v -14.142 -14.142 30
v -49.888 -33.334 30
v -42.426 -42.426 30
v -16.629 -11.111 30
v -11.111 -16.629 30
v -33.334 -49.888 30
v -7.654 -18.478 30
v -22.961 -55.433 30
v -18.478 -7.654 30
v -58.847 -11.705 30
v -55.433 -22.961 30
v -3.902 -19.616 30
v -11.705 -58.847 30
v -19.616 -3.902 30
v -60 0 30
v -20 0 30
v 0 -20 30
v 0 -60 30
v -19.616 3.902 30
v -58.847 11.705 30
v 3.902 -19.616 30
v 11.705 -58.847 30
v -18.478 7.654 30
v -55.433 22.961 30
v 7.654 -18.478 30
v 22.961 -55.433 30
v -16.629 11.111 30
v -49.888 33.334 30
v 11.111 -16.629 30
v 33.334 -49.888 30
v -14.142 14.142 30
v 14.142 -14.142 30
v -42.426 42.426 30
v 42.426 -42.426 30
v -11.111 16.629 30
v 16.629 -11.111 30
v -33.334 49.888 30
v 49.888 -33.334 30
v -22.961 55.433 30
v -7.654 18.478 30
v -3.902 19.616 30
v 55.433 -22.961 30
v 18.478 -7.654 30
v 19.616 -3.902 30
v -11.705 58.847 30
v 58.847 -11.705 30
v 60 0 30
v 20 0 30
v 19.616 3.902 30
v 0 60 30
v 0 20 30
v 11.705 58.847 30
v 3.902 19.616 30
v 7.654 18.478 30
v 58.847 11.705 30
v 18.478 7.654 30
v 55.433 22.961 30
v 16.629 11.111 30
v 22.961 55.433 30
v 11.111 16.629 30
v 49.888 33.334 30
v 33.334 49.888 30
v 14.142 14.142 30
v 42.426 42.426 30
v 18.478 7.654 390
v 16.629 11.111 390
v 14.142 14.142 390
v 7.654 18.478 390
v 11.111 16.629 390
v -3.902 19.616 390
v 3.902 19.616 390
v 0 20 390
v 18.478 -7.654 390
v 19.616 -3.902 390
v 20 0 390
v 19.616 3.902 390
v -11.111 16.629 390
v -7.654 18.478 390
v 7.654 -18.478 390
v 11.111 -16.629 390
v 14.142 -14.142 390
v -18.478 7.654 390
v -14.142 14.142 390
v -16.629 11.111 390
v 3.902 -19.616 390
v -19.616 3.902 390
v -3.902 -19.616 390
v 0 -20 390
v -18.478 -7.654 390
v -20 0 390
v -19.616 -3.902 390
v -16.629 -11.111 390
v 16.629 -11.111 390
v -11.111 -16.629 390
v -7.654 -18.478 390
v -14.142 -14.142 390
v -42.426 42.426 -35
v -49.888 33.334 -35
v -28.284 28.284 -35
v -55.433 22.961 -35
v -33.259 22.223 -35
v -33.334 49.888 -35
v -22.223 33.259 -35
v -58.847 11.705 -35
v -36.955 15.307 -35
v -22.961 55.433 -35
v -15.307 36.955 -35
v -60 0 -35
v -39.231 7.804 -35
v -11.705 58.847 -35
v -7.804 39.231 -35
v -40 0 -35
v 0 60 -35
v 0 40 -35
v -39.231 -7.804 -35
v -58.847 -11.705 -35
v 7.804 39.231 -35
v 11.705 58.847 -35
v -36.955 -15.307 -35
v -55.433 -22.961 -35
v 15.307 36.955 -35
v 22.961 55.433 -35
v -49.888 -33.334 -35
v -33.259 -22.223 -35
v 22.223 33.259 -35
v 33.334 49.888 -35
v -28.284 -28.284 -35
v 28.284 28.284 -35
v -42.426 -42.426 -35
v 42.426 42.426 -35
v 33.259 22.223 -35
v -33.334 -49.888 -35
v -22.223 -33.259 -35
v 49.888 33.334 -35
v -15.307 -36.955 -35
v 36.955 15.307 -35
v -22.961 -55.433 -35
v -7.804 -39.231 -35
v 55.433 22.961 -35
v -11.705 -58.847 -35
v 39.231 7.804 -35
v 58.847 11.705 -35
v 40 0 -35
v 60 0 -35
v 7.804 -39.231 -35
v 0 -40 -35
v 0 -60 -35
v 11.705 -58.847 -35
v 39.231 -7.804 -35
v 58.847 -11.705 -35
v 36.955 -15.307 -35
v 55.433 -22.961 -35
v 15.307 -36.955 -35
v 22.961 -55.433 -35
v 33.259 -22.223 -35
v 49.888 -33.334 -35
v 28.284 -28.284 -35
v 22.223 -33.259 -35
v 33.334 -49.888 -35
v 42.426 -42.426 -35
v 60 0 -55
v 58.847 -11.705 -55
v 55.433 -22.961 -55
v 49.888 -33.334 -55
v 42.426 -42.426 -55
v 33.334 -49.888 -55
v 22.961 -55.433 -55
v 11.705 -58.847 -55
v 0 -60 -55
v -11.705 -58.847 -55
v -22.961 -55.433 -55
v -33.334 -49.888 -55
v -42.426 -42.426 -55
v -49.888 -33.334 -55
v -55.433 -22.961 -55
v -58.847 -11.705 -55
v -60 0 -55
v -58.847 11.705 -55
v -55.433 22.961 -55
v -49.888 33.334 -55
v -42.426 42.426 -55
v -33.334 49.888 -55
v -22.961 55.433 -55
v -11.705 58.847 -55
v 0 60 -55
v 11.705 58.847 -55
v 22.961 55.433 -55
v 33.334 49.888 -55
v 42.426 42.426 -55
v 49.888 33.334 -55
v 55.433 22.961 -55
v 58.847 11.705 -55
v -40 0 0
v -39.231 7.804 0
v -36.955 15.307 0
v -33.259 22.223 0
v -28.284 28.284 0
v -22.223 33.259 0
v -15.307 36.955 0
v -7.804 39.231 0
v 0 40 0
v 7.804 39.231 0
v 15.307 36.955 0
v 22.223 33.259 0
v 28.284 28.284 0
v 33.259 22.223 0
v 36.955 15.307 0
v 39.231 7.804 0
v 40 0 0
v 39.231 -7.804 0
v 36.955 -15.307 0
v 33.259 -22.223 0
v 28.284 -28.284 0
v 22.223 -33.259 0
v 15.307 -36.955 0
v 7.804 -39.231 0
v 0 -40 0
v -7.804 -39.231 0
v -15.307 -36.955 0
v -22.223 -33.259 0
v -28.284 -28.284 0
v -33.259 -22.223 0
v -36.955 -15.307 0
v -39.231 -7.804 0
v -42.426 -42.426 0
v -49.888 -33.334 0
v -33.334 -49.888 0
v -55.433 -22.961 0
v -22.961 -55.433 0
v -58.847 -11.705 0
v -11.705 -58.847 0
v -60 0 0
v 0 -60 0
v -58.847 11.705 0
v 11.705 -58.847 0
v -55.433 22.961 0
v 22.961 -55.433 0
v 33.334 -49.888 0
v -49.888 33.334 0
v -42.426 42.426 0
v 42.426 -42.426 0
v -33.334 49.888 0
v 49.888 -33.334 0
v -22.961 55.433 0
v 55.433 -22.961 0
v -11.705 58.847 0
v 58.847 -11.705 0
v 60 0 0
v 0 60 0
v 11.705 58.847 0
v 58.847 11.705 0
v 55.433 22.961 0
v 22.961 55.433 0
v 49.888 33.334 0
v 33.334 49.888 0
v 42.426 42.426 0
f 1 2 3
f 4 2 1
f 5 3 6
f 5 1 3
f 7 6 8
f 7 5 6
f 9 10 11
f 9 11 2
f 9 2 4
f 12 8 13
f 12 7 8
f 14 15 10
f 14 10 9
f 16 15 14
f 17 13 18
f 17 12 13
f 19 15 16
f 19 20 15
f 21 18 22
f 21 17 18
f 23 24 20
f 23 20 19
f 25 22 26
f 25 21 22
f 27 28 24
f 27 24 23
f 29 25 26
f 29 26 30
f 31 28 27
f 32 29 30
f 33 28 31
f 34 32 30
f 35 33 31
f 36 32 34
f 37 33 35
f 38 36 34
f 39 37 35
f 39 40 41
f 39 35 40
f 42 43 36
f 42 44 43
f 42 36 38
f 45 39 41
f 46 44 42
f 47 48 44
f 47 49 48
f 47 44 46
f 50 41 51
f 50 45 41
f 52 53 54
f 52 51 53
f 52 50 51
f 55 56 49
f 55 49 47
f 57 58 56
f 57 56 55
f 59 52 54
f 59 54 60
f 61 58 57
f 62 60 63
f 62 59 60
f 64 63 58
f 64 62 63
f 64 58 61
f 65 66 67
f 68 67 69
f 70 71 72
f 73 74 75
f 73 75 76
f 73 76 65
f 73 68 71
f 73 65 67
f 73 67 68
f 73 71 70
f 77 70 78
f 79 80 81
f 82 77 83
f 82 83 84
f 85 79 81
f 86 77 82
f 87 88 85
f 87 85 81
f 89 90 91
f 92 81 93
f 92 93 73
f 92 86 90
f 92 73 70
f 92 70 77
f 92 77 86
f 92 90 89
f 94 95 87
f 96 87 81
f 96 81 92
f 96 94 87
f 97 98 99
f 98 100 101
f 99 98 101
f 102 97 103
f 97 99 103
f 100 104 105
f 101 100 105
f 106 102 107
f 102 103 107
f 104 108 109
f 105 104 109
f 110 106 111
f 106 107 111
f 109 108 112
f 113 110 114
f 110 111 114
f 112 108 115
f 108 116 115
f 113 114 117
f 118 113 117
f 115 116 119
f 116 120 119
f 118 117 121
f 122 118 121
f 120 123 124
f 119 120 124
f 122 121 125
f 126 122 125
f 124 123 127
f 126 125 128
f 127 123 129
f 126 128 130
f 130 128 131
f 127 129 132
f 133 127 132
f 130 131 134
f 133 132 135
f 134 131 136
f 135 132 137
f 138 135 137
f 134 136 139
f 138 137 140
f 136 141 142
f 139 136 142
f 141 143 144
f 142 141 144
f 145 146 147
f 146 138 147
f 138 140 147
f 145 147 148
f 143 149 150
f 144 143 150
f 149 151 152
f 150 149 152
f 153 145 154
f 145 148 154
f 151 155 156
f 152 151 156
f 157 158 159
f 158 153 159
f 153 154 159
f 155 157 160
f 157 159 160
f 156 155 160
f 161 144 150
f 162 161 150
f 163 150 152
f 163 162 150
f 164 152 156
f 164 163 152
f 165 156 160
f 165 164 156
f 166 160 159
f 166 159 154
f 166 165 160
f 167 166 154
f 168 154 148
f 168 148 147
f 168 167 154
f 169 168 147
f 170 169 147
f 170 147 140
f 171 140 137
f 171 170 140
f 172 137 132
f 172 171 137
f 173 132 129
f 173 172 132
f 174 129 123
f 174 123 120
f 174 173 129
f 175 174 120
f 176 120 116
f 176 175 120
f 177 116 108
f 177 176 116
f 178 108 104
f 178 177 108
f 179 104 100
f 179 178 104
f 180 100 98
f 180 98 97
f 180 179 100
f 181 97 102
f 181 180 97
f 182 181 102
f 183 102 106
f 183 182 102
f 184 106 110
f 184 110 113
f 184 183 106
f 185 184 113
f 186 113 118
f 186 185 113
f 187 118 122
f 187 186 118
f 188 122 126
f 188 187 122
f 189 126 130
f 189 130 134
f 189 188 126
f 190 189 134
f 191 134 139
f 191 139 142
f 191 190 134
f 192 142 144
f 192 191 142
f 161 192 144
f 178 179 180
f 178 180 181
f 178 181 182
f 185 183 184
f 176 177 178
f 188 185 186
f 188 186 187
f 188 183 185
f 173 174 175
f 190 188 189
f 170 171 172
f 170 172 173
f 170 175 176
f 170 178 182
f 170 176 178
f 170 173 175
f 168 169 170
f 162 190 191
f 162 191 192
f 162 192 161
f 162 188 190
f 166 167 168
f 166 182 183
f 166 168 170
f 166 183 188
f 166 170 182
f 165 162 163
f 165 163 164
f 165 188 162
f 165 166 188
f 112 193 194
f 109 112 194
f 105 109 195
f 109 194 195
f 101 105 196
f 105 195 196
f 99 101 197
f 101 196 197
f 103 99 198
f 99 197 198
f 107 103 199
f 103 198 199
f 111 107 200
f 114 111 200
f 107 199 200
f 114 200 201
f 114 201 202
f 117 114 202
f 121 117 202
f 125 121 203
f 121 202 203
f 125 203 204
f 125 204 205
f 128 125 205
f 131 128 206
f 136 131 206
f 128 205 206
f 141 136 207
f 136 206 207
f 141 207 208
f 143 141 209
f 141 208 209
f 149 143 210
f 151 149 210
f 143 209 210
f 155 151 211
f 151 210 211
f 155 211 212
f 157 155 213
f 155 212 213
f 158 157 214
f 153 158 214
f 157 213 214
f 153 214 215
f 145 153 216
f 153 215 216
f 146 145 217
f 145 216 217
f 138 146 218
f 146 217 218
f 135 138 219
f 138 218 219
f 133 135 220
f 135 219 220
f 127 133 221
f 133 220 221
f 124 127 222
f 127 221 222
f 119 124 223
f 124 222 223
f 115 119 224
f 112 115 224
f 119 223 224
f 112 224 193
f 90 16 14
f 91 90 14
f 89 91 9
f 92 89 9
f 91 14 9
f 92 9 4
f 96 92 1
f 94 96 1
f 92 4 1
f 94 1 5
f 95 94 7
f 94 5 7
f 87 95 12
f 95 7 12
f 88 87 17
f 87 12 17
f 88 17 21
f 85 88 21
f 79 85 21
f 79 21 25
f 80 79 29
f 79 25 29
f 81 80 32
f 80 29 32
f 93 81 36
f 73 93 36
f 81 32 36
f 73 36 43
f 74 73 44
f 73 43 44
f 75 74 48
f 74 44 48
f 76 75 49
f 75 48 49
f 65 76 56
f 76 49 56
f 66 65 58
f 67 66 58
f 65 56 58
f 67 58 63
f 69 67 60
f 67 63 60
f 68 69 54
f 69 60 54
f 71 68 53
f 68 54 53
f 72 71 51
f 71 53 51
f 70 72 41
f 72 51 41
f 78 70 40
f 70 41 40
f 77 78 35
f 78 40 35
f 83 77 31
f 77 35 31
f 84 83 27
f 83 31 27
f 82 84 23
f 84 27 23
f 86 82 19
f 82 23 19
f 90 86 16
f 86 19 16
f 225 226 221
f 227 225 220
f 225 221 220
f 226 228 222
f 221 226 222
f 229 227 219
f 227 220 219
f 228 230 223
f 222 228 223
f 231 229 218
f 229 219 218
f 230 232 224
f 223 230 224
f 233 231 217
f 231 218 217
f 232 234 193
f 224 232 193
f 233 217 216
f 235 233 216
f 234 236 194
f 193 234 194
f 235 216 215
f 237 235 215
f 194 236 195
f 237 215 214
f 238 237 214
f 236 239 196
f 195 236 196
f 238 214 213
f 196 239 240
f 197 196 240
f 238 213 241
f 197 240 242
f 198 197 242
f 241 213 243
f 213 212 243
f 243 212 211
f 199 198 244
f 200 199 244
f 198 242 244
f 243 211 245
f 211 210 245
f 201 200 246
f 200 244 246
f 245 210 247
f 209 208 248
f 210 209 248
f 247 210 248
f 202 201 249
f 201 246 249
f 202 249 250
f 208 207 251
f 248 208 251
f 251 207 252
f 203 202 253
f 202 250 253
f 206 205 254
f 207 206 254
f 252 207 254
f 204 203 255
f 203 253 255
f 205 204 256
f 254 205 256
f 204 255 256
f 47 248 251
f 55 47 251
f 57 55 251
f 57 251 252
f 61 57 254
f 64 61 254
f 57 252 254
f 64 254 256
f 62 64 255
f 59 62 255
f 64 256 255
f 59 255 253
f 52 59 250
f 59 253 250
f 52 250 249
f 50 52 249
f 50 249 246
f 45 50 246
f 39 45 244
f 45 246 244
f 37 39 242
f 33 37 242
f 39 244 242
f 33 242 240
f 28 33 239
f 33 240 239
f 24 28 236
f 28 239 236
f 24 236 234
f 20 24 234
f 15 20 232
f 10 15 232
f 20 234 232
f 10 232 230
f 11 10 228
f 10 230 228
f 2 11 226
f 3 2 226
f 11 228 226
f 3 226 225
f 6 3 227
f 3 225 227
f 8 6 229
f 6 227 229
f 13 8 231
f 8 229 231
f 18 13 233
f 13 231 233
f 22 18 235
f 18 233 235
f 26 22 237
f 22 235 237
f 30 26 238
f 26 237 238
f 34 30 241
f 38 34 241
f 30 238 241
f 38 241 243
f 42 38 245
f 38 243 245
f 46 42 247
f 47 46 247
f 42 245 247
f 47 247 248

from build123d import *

# Parameters (mm, degrees)
SKIZZE1_R                       = 60
AUFSATZ_LINEAR_AUSTRAGEN1_DEPTH = 30
SKIZZE2_R                       = 20
AUFSATZ_LINEAR_AUSTRAGEN2_DEPTH = 360
SKIZZE3_R                       = 40
AUFSATZ_LINEAR_AUSTRAGEN3_DEPTH = 35
AUFSATZ_LINEAR_START            = 20
SKIZZE4_R                       = 60
AUFSATZ_LINEAR_AUSTRAGEN4_DEPTH = 20


with BuildPart() as part:
    # Skizze1 → Aufsatz-Linear austragen1 (new body)
    with BuildSketch(Plane.XY):
        Circle(SKIZZE1_R)
    extrude(amount=AUFSATZ_LINEAR_AUSTRAGEN1_DEPTH)

    # Skizze2 → Aufsatz-Linear austragen2 (add)
    with BuildSketch(Plane.XY.offset(30)):
        with Locations(Location((0, 0, 0), (0, 0, 180))):
            Circle(SKIZZE2_R)
    extrude(amount=AUFSATZ_LINEAR_AUSTRAGEN2_DEPTH)

    # Skizze3 → Aufsatz-Linear austragen3 (add)
    with BuildSketch(Plane(origin=(0, 0, 0), x_dir=(-1, 0, 0), z_dir=(0, 0, -1))):
        Circle(SKIZZE3_R)
    extrude(amount=AUFSATZ_LINEAR_AUSTRAGEN3_DEPTH)

    # Skizze4 → Aufsatz-Linear austragen4 (add)
    with BuildSketch(Plane(origin=(0, 0, -35), x_dir=(-1, 0, 0), z_dir=(0, 0, -1)).offset(AUFSATZ_LINEAR_START)):
        with Locations(Location((0, 0, 0), (0, 0, 180))):
            Circle(SKIZZE4_R)
    extrude(amount=-AUFSATZ_LINEAR_AUSTRAGEN4_DEPTH)


solid = part.part
